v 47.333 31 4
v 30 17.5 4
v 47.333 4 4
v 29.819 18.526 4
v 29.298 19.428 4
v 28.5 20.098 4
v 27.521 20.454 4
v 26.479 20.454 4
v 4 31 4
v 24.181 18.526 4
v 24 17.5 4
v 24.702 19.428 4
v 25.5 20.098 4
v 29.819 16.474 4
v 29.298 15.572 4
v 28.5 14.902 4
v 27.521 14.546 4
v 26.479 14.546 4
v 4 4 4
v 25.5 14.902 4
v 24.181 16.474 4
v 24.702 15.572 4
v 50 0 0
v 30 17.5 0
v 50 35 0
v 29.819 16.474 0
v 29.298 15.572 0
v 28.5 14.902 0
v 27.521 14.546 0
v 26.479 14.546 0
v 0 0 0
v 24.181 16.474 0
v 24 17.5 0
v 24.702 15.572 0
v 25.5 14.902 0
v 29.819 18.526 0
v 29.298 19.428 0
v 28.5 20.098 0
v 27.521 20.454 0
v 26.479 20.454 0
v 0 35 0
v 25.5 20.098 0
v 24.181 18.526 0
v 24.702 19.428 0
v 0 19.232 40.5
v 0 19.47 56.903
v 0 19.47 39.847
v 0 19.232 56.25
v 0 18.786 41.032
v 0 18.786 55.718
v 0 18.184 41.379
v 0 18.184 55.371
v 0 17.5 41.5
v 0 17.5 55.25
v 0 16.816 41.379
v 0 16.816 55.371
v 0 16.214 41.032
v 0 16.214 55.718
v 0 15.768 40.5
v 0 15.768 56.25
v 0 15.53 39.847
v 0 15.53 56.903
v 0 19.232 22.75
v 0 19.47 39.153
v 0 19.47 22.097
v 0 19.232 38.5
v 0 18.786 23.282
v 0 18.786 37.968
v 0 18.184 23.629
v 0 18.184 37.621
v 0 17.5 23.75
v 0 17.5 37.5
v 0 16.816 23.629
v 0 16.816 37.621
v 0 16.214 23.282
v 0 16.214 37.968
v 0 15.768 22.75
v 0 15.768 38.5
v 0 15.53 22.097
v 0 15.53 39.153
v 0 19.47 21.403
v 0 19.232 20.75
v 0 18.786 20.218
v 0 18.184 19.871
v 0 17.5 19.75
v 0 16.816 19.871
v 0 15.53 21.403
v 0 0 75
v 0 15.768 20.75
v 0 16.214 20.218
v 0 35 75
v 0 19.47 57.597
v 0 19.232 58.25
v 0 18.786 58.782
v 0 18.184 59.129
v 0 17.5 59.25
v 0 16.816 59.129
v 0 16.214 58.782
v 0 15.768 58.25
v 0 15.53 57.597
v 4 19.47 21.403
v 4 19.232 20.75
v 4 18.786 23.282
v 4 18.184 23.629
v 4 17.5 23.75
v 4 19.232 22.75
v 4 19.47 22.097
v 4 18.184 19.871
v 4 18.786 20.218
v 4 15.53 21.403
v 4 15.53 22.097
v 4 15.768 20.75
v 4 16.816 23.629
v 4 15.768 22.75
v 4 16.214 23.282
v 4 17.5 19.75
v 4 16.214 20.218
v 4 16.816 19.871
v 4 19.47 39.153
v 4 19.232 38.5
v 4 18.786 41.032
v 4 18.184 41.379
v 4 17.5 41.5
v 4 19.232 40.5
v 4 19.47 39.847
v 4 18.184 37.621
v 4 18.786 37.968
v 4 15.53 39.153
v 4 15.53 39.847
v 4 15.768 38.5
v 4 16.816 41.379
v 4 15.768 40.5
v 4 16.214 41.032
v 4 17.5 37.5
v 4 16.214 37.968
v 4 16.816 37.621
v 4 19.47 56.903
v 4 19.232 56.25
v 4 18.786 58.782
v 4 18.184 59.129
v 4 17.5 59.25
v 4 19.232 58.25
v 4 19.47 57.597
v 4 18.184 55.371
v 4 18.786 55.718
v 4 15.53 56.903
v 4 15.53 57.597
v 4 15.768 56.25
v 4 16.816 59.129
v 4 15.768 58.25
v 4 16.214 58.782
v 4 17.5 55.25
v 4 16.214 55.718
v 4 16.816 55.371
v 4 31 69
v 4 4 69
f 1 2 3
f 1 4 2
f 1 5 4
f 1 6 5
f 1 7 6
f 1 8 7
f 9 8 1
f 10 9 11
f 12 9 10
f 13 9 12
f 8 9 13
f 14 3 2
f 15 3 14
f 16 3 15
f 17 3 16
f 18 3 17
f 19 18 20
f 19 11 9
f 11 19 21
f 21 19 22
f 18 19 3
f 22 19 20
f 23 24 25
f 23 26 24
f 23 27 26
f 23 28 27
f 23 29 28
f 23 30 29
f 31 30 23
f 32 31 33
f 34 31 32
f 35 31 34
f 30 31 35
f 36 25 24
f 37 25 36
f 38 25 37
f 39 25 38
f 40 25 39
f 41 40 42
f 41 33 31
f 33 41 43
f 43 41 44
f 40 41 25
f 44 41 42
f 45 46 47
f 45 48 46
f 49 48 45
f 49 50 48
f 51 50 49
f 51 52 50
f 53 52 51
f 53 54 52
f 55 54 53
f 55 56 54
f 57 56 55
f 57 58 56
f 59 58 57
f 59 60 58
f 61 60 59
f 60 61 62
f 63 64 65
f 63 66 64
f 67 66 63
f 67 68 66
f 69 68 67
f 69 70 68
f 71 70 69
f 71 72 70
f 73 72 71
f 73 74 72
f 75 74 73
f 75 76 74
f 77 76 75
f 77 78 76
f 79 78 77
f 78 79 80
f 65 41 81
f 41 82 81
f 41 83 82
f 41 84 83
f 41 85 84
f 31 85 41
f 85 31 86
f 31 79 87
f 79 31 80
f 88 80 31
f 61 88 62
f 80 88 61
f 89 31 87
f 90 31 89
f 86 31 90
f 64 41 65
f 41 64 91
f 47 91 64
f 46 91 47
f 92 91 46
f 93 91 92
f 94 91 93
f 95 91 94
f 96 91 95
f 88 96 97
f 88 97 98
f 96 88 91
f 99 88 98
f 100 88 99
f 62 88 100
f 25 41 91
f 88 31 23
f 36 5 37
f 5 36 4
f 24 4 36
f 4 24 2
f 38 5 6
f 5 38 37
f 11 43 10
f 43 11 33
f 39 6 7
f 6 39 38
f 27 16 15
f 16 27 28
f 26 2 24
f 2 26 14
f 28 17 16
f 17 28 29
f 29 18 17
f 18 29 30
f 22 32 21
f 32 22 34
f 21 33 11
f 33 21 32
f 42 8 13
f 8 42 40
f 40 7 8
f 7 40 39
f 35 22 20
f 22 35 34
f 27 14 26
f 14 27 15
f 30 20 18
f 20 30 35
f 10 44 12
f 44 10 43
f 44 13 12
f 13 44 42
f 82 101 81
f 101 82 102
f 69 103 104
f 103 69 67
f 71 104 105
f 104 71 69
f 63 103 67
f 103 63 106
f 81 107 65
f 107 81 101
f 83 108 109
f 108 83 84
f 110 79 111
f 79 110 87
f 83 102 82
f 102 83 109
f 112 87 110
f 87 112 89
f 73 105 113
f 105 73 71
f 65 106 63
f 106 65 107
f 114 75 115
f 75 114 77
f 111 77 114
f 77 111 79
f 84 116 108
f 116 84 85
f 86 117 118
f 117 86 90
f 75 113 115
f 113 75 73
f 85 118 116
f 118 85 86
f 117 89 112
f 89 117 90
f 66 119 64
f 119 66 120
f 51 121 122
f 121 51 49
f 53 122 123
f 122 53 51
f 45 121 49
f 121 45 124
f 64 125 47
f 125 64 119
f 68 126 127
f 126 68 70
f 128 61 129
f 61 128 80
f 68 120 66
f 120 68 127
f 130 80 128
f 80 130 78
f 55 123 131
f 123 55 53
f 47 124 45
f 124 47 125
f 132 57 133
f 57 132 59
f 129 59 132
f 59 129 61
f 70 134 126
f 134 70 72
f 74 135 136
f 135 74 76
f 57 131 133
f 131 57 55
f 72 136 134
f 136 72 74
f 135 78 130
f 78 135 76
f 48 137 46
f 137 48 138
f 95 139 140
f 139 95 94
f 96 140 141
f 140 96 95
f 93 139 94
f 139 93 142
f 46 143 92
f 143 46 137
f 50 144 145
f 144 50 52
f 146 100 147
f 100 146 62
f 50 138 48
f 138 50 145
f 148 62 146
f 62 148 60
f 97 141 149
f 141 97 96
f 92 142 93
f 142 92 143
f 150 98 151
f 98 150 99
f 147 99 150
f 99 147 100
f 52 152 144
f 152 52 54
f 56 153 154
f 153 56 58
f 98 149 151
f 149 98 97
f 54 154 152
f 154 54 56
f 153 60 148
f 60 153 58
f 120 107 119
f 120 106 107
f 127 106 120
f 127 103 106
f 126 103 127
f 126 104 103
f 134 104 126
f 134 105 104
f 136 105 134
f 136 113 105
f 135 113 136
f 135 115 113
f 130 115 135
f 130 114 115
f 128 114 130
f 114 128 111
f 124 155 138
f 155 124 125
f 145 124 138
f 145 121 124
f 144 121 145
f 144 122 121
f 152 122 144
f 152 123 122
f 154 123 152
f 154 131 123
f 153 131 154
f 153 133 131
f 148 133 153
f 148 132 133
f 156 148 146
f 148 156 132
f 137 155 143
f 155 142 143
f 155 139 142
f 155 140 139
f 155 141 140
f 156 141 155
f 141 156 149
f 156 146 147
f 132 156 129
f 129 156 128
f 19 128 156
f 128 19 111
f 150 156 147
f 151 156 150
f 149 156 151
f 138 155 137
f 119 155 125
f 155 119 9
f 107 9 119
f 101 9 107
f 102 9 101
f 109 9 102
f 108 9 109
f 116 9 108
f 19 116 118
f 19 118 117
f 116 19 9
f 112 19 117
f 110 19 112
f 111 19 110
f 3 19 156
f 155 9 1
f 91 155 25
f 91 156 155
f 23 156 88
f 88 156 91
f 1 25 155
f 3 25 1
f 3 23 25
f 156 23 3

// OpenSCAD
module xhole_plate(size, h_dm, h_num, margin) {
    difference(){
        cube(size);
        h_distance = (size.x - margin) / (h_num + 1);
        for (x = [1:h_num])
        translate ([
            margin + x * h_distance,
            size.y/2,
            -1
        ]) cylinder( d = h_dm, h = size.z + 2, $fn=18);
    }		
}
module shelf_bracket(side_a, side_b, width, thickness) {
difference() {
union() {
	// side A
	xhole_plate(
		[side_a[0], width, thickness],
		side_a[1],
		side_a[2],
		thickness
	);
	// side B
    translate([thickness,0,0])
    rotate([0,-90,0])
	xhole_plate(
		[side_b[0], width, thickness],
		side_b[1],
		side_b[2],
		thickness
	);
	// stringer
	cube([side_a[0], thickness, side_b[0]]);
	translate([0, width - thickness, 0])
	cube([side_a[0], thickness, side_b[0]]);
    }
    diag  = sqrt( pow(side_a[0], 2) + pow(side_b[0], 2) );
    //angle = asin( side_a[0] / diag );
    angle = atan(side_a[0]/side_b[0]);

    translate( [side_a[0], -1, 0] )
    rotate( [0, -angle, 0] )
    cube( [diag, width + 2, diag + 2] );
}
}
module output(templates = false) {
	if (templates) {
		projection(cut = true)
		children(0);		
		translate( [-0.01, 0, 0] )
		projection(cut = true)
		rotate( [0, -90, 0] )
		children(0);		
	} else {
		children(0);
	}
}
//projection(cut = true)
//rotate( [0, -90, 0] )
output(templates = false)
shelf_bracket(
//[length, hole size, number of holes]
  side_a    = [50, 6, 1],
  side_b    = [75, 4, 3],
  width     = 35,
  thickness = 4
);
